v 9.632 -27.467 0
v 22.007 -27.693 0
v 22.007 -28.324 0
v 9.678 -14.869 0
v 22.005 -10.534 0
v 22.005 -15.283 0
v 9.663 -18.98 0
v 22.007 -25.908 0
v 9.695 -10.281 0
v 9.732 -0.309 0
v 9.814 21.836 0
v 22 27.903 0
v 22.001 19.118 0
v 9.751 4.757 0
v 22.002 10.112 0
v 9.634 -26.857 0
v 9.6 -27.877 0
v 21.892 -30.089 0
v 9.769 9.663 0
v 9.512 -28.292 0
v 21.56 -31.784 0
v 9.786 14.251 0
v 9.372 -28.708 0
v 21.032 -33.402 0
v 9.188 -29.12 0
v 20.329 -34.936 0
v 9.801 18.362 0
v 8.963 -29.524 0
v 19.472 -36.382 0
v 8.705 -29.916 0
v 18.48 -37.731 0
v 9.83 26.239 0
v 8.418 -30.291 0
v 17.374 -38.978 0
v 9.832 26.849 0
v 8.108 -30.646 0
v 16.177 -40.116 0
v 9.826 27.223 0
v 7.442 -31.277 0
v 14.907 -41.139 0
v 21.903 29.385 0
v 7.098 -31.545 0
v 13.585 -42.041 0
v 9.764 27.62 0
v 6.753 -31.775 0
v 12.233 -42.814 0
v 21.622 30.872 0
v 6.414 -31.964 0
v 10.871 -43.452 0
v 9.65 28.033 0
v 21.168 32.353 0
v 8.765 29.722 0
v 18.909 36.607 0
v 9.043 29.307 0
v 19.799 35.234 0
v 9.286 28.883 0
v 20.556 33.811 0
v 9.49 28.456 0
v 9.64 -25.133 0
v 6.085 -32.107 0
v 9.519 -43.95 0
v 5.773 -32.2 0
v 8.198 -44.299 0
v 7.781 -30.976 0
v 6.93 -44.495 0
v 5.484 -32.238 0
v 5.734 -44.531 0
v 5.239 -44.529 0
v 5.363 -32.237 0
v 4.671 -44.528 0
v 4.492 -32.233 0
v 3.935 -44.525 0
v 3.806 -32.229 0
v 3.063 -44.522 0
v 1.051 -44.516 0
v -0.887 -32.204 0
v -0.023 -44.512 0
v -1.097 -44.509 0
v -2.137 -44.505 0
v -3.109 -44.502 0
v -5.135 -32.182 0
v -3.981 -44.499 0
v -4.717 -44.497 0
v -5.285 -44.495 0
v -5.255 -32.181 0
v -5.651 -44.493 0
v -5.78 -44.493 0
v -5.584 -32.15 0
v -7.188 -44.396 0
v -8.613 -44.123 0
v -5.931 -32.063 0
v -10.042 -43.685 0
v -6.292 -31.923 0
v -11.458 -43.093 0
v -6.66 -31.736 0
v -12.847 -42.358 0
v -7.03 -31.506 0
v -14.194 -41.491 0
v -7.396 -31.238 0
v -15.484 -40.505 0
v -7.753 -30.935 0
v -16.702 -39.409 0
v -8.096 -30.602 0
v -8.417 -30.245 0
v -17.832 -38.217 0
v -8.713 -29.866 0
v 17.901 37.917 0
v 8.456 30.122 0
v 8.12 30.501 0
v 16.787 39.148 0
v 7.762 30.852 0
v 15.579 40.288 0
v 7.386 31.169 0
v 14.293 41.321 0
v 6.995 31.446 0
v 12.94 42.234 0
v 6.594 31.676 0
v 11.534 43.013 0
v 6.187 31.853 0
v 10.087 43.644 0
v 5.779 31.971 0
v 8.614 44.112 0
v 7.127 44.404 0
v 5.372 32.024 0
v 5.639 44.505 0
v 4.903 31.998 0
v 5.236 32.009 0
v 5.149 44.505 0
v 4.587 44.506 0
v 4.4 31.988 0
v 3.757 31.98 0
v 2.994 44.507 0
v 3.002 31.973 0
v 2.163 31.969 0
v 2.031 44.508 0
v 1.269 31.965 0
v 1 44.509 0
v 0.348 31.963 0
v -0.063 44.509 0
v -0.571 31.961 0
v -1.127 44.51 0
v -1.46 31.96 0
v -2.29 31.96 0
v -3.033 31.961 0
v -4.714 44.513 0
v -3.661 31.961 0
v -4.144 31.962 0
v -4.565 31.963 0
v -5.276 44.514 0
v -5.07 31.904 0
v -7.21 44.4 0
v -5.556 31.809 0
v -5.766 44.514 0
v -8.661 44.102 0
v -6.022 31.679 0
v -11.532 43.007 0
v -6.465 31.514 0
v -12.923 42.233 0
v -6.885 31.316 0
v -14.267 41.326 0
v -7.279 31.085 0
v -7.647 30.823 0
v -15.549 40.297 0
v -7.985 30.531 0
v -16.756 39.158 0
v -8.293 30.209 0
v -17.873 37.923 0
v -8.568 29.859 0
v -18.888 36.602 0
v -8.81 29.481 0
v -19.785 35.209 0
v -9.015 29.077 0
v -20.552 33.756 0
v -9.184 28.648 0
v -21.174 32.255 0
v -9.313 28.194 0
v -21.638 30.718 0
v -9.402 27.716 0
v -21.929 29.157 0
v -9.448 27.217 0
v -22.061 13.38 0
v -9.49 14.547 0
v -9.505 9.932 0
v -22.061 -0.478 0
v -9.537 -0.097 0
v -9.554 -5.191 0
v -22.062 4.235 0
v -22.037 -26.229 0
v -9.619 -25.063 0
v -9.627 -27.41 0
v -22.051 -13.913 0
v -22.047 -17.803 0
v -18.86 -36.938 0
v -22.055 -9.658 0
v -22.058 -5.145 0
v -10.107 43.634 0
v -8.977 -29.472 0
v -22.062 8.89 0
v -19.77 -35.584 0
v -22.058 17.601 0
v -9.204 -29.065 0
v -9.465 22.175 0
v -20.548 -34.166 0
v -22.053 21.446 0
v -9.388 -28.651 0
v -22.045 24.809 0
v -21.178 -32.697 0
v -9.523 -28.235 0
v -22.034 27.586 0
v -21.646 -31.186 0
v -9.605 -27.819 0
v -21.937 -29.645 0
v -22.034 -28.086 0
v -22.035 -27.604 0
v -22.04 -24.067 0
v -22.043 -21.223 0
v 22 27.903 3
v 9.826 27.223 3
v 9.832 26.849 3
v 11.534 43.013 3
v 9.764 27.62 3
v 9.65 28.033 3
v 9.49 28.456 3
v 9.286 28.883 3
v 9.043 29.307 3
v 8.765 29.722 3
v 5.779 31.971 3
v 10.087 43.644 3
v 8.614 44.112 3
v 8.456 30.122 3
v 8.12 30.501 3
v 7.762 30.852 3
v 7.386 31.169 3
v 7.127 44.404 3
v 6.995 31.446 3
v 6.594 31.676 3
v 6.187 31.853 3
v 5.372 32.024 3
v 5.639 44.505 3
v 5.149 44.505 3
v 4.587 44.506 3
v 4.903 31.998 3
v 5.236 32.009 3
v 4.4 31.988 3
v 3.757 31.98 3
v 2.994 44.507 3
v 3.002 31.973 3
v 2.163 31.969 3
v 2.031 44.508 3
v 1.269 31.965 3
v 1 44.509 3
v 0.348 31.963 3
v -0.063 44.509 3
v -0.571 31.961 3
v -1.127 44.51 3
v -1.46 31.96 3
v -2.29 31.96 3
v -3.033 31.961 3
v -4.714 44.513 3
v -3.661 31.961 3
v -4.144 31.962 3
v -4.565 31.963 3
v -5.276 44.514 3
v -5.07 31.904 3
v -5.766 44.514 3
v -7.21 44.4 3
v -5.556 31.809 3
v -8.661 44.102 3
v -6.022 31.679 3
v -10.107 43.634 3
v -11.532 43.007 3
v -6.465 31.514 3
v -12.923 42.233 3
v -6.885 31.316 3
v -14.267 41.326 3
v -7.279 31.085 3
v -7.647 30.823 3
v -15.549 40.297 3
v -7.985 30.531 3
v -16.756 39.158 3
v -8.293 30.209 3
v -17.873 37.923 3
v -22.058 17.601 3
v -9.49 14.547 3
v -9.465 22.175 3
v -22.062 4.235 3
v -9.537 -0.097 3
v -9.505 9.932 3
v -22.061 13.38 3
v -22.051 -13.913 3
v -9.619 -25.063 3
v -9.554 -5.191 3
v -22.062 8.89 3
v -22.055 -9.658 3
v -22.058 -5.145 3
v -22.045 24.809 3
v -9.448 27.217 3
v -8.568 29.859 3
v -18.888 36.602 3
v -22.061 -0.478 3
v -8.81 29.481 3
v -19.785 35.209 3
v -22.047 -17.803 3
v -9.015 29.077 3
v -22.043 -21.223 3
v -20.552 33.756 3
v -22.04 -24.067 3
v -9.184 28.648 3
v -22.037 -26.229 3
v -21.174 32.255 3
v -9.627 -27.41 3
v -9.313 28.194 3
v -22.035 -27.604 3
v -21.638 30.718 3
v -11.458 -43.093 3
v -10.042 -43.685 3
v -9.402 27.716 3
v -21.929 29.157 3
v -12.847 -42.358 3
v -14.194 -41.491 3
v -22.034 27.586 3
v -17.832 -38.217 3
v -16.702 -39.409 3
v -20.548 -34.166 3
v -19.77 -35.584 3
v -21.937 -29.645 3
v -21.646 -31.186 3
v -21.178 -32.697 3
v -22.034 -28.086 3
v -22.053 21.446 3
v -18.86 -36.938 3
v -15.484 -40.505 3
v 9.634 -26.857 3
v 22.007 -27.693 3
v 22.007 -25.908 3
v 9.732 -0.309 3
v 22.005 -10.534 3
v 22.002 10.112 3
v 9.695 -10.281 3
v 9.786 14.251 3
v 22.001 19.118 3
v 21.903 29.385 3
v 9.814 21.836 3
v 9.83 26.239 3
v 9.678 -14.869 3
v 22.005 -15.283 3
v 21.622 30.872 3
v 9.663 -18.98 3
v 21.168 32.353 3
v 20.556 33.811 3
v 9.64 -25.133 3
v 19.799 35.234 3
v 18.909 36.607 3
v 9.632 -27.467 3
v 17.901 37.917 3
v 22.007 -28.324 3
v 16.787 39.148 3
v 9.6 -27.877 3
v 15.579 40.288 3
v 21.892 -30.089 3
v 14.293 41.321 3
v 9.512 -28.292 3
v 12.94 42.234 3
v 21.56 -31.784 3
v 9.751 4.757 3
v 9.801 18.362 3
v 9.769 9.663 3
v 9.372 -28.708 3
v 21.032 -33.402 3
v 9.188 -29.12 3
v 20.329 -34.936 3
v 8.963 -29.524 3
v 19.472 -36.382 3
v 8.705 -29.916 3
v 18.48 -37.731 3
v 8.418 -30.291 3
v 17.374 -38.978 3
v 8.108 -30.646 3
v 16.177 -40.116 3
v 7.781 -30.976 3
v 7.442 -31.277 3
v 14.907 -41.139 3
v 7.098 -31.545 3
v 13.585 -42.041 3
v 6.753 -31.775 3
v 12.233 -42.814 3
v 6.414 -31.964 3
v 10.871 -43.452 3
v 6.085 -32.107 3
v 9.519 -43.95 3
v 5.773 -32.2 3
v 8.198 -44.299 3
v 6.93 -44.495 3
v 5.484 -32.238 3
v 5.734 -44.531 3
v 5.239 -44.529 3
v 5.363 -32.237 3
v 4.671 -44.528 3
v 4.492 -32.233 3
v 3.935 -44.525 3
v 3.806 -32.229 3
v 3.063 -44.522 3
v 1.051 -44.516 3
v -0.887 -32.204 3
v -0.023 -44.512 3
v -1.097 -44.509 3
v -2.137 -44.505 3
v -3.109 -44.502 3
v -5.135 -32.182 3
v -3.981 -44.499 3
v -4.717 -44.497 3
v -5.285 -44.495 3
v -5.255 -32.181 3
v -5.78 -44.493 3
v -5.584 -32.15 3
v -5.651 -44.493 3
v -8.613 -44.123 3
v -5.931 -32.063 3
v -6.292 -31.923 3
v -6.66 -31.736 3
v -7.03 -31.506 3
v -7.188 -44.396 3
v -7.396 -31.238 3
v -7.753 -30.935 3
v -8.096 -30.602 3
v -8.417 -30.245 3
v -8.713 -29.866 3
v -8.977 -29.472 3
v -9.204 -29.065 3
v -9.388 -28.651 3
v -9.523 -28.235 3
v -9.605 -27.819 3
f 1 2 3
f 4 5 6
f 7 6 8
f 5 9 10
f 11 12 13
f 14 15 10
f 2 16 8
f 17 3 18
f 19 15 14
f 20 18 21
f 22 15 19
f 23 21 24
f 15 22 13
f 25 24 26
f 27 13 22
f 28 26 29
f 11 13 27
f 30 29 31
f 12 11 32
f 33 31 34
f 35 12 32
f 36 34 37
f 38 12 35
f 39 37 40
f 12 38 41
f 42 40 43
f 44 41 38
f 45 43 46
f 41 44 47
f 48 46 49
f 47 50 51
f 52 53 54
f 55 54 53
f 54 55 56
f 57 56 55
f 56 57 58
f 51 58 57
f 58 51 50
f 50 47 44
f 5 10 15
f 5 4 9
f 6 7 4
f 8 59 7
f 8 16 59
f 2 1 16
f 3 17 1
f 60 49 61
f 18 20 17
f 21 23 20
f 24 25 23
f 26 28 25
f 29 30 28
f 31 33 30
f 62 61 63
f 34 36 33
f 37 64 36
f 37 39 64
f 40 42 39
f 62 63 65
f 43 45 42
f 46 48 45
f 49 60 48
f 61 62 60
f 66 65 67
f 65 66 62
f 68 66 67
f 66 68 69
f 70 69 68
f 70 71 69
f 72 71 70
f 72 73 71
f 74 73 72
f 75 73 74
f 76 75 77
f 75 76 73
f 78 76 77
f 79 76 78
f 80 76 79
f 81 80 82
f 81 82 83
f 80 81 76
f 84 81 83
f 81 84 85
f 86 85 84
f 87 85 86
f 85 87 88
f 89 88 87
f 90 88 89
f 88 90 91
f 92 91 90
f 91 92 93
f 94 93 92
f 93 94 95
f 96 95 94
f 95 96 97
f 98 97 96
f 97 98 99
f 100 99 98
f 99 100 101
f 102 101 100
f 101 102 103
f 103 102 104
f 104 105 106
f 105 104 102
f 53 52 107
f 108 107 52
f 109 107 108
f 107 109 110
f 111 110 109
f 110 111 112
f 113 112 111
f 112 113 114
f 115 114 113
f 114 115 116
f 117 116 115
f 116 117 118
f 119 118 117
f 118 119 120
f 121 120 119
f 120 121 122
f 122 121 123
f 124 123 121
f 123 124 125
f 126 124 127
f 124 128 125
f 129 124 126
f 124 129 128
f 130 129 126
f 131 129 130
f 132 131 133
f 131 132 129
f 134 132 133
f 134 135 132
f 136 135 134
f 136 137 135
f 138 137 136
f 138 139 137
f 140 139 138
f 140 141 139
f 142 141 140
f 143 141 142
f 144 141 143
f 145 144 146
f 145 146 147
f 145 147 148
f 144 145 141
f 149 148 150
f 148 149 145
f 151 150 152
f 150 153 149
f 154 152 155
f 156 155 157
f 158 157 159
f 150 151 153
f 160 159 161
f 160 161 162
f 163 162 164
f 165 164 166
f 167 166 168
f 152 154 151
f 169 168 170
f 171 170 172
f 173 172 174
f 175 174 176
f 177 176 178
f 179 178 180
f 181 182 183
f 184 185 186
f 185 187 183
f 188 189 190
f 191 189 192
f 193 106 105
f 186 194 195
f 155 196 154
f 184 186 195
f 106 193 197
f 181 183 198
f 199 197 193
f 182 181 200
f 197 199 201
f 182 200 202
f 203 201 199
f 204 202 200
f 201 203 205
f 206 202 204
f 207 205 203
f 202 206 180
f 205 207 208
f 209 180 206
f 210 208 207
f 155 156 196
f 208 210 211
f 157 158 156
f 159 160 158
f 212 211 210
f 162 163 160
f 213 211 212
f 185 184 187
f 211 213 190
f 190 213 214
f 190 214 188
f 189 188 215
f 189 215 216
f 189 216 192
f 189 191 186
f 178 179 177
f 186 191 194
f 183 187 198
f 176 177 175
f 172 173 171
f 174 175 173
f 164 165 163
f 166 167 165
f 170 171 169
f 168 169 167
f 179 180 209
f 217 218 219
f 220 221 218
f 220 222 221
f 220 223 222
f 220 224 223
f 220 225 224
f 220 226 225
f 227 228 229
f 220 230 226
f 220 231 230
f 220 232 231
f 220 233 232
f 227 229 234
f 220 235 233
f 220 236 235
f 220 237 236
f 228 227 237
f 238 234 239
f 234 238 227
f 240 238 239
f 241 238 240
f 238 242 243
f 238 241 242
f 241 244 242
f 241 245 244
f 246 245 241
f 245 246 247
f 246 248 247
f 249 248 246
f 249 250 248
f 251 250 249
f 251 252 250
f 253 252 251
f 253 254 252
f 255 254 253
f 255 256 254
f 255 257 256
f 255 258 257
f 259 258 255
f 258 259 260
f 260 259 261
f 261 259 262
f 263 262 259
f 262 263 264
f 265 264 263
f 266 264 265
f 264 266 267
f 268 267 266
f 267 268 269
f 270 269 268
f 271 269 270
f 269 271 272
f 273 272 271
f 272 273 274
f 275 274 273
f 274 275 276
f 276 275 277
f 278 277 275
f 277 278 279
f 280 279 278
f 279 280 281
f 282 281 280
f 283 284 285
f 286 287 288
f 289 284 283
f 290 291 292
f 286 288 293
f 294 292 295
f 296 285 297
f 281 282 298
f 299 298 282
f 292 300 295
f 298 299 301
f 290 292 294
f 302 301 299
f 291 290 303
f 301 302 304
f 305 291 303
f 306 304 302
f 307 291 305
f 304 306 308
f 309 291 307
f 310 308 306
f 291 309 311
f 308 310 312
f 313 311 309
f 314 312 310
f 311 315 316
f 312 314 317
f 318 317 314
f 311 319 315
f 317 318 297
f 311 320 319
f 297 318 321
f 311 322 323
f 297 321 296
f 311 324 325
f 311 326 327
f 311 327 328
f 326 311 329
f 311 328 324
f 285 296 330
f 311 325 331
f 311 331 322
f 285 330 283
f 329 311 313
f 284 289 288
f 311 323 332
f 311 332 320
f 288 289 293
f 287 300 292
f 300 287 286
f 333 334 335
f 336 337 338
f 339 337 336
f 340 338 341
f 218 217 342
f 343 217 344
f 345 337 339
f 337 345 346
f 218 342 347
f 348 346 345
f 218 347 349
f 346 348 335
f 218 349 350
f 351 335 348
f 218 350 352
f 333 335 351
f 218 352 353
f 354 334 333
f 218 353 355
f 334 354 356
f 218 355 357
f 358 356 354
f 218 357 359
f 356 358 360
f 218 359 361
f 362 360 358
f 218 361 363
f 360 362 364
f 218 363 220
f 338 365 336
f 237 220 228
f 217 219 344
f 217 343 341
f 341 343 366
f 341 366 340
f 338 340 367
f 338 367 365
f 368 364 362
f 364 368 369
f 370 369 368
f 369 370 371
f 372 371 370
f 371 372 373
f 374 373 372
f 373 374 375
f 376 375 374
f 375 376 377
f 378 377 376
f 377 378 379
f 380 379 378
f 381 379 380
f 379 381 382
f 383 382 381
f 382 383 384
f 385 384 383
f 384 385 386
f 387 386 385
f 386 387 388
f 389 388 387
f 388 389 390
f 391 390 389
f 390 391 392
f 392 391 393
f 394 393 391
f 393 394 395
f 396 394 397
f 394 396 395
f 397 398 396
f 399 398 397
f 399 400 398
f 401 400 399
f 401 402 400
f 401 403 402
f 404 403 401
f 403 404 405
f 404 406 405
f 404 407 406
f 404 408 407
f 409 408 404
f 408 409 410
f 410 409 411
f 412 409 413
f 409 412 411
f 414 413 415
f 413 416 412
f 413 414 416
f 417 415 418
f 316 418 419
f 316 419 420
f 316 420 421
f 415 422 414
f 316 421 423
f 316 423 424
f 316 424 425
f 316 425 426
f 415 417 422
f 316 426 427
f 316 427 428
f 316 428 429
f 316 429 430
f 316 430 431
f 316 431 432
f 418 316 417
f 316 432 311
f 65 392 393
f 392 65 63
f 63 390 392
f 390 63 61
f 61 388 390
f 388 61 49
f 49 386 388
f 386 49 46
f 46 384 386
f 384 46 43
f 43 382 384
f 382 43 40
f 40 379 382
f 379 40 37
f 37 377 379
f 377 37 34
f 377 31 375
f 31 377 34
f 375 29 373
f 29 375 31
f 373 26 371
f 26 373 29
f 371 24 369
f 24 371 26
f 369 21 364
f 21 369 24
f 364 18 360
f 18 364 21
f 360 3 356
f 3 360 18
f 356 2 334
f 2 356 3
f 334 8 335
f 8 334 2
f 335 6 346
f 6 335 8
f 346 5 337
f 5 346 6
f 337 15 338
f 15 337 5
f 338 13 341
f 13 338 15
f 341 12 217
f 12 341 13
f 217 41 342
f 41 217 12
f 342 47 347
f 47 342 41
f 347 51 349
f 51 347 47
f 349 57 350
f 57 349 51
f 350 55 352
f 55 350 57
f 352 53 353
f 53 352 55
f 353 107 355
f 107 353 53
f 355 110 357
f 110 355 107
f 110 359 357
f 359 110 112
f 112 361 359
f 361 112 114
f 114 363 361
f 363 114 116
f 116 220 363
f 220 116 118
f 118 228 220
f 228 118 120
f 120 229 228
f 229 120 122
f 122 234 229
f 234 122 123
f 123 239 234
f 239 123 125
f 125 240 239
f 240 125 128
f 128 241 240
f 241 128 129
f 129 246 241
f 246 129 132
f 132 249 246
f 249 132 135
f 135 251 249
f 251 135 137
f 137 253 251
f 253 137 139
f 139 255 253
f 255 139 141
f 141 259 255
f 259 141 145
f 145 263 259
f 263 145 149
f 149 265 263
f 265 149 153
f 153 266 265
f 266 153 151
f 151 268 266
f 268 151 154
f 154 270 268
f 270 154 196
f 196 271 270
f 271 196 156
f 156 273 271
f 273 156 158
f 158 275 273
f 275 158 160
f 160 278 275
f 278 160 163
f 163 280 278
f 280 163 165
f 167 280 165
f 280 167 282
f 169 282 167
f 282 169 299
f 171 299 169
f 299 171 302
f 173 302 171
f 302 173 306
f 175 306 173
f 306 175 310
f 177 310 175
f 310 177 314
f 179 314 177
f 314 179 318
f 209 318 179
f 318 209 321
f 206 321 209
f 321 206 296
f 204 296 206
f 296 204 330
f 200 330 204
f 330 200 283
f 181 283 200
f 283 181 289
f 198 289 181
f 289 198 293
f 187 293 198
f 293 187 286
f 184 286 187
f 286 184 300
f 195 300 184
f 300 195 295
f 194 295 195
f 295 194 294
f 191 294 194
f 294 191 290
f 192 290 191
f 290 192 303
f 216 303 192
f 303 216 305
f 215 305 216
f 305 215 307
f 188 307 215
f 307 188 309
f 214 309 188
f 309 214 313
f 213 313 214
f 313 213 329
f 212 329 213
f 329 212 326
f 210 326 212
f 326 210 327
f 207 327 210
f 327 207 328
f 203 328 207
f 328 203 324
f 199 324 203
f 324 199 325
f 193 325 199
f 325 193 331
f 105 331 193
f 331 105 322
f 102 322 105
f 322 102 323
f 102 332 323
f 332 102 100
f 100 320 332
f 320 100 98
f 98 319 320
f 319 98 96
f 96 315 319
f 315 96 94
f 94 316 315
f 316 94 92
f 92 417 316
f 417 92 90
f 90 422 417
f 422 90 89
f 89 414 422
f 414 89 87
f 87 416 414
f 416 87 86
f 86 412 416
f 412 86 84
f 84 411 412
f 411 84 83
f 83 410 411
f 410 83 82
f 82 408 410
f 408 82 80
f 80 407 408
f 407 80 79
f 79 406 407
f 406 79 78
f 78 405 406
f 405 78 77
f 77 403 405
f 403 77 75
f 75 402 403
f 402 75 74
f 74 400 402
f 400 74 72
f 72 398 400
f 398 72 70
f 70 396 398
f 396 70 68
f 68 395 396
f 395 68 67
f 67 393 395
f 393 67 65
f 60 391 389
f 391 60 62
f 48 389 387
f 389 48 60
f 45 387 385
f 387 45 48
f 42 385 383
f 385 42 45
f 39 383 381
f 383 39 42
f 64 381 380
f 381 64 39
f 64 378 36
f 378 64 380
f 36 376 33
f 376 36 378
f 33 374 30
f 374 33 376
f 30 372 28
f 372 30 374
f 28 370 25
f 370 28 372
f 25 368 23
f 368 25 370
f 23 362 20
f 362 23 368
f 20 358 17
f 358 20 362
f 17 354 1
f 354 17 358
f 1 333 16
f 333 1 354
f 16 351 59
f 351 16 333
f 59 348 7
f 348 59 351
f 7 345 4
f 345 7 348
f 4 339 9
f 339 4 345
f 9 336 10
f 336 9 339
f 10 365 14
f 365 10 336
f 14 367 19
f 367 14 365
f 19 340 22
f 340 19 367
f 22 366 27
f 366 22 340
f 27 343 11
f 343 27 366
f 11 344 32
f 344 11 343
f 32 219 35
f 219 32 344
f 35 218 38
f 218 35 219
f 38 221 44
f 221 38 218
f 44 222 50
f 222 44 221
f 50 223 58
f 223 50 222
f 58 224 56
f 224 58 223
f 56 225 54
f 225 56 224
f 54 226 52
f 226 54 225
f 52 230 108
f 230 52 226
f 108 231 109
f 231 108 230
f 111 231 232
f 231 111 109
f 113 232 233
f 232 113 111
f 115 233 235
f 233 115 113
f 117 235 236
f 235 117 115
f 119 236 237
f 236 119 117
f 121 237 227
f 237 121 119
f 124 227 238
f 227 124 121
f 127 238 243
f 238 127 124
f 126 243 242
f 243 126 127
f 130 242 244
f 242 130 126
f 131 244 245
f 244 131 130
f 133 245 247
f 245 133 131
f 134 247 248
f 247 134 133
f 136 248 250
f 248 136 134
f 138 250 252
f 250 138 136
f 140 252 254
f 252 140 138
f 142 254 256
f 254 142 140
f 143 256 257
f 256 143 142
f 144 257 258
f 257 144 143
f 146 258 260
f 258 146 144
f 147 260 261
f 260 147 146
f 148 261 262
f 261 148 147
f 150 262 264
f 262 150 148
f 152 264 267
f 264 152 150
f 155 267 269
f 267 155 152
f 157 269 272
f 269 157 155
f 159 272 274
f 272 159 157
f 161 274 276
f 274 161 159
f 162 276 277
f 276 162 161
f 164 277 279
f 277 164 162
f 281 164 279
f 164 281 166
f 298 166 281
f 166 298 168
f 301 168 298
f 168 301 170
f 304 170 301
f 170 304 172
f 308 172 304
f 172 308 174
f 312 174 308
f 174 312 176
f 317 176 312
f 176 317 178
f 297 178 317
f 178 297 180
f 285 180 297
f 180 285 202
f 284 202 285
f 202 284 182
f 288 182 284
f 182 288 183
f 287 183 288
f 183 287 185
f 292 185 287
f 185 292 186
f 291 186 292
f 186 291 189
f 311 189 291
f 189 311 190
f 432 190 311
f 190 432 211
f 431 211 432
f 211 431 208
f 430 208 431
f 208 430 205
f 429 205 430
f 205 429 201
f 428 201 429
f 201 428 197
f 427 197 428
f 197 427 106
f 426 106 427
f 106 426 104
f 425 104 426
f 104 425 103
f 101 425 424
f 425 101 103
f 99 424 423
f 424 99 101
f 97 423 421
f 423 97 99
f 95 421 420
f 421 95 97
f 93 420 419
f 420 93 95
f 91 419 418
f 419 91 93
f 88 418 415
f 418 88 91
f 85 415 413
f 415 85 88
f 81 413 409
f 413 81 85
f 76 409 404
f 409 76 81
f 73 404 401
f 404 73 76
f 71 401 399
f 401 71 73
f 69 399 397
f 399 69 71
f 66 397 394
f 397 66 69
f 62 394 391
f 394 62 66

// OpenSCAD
// Generated from 交通部公路局（原交通部公路總局）「新式號牌使用之英文字、數字字體」author trace
fudge = 0.1;

module glyph_2012_0(h = 3) {
  difference() {
    linear_extrude(height = h)
      polygon(points = [[-5.7662, 44.5141], [-7.21, 44.3997], [-8.6614, 44.1022], [-10.1067, 43.6337], [-11.5319, 43.0067], [-12.9233, 42.2334], [-14.267, 41.326], [-15.5491, 40.297], [-16.7558, 39.1585], [-17.8733, 37.9228], [-18.8877, 36.6024], [-19.7852, 35.2093], [-20.5519, 33.756], [-21.174, 32.2546], [-21.6377, 30.7176], [-21.9292, 29.1572], [-22.0345, 27.5856], [-22.0449, 24.8095], [-22.0526, 21.4461], [-22.058, 17.6012], [-22.0612, 13.3805], [-22.0625, 8.8899], [-22.0623, 4.235], [-22.0607, -0.4785], [-22.0582, -5.1447], [-22.0549, -9.658], [-22.0511, -13.9126], [-22.0472, -17.8027], [-22.0434, -21.2227], [-22.0399, -24.0667], [-22.0371, -26.2291], [-22.0352, -27.6041], [-22.0345, -28.0859], [-21.9367, -29.645], [-21.6464, -31.1857], [-21.1785, -32.6966], [-20.548, -34.1665], [-19.7701, -35.584], [-18.8597, -36.9378], [-17.8319, -38.2168], [-16.7017, -39.4095], [-15.4842, -40.5048], [-14.1944, -41.4912], [-12.8473, -42.3576], [-11.4581, -43.0926], [-10.0416, -43.6849], [-8.6131, -44.1233], [-7.1875, -44.3965], [-5.7799, -44.4931], [-5.6506, -44.4935], [-5.2851, -44.4948], [-4.7173, -44.4966], [-3.9809, -44.4991], [-3.1095, -44.5019], [-2.1369, -44.5051], [-1.0968, -44.5086], [-0.023, -44.5121], [1.0507, -44.5157], [2.0908, -44.5191], [3.0634, -44.5223], [3.9348, -44.5252], [4.6712, -44.5276], [5.239, -44.5295], [5.6045, -44.5307], [5.7338, -44.5311], [6.9298, -44.4955], [8.1984, -44.2995], [9.5189, -43.9496], [10.8707, -43.4522], [12.2329, -42.8137], [13.5851, -42.0407], [14.9066, -41.1394], [16.1766, -40.1165], [17.3745, -38.9783], [18.4798, -37.7312], [19.4716, -36.3818], [20.3294, -34.9365], [21.0325, -33.4016], [21.5602, -31.7837], [21.8919, -30.0892], [22.0069, -28.3245], [22.0069, -27.693], [22.0066, -25.9084], [22.0063, -23.1355], [22.0059, -19.5389], [22.0054, -15.2833], [22.0049, -10.5336], [22.0043, -5.4545], [22.0037, -0.2106], [22.0031, 5.0334], [22.0025, 10.1125], [22.0019, 14.8622], [22.0014, 19.1178], [22.001, 22.7144], [22.0007, 25.4873], [22.0005, 27.2719], [22.0004, 27.9034], [21.9035, 29.3846], [21.6217, 30.8723], [21.1682, 32.3526], [20.5563, 33.8112], [19.799, 35.2342], [18.9095, 36.6074], [17.901, 37.9168], [16.7866, 39.1483], [15.5795, 40.2877], [14.2929, 41.3211], [12.9399, 42.2343], [11.5336, 43.0133], [10.0873, 43.6439], [8.6141, 44.1121], [7.1271, 44.4038], [5.6395, 44.5049], [5.5114, 44.505], [5.1494, 44.5053], [4.5869, 44.5058], [3.8573, 44.5064], [2.9941, 44.5071], [2.0307, 44.5078], [1.0004, 44.5087], [-0.0634, 44.5095], [-1.1271, 44.5104], [-2.1574, 44.5112], [-3.1208, 44.512], [-3.9841, 44.5127], [-4.7136, 44.5133], [-5.2761, 44.5137], [-5.6381, 44.514]]);
    translate([0, 0, -fudge])
      linear_extrude(height = h + 2 * fudge)
        polygon(points = [[5.372, 32.0236], [5.7786, 31.971], [6.1874, 31.853], [6.5943, 31.6758], [6.9952, 31.4457], [7.386, 31.1691], [7.7624, 30.8521], [8.1205, 30.5011], [8.4559, 30.1224], [8.7648, 29.7223], [9.0427, 29.307], [9.2858, 28.8828], [9.4898, 28.4561], [9.6505, 28.033], [9.764, 27.62], [9.8259, 27.2232], [9.8323, 26.849], [9.8301, 26.239], [9.8237, 24.5151], [9.8138, 21.8364], [9.8009, 18.3621], [9.7857, 14.2513], [9.7688, 9.6631], [9.7507, 4.7567], [9.7319, -0.3089], [9.7132, -5.3745], [9.6951, -10.281], [9.6781, -14.8692], [9.6629, -18.98], [9.6501, -22.4543], [9.6402, -25.1329], [9.6338, -26.8568], [9.6316, -27.4668], [9.5999, -27.8772], [9.5116, -28.2923], [9.3722, -28.7079], [9.1876, -29.1199], [8.9632, -29.5239], [8.7047, -29.9157], [8.4177, -30.2912], [8.1079, -30.6461], [7.781, -30.9762], [7.4424, -31.2773], [7.0979, -31.5452], [6.7531, -31.7755], [6.4137, -31.9642], [6.0852, -32.1069], [5.7732, -32.1996], [5.4836, -32.2378], [5.363, -32.2372], [5.0221, -32.2354], [4.4925, -32.2326], [3.8056, -32.2289], [2.9929, -32.2246], [2.0857, -32.2198], [1.1157, -32.2147], [0.1142, -32.2094], [-0.8874, -32.2041], [-1.8574, -32.199], [-2.7646, -32.1942], [-3.5773, -32.1899], [-4.2642, -32.1863], [-4.7938, -32.1835], [-5.1347, -32.1817], [-5.2553, -32.181], [-5.584, -32.15], [-5.9315, -32.0626], [-6.292, -31.9231], [-6.6601, -31.7362], [-7.0301, -31.5062], [-7.3964, -31.2376], [-7.7535, -30.9349], [-8.0956, -30.6025], [-8.4174, -30.2448], [-8.7131, -29.8664], [-8.9771, -29.4718], [-9.2039, -29.0653], [-9.3878, -28.6514], [-9.5234, -28.2346], [-9.6049, -27.8193], [-9.6268, -27.41], [-9.6248, -26.7965], [-9.6191, -25.0628], [-9.6103, -22.3688], [-9.5989, -18.8746], [-9.5854, -14.7403], [-9.5703, -10.1258], [-9.5542, -5.1913], [-9.5375, -0.0967], [-9.5209, 4.9979], [-9.5048, 9.9324], [-9.4897, 14.5469], [-9.4762, 18.6812], [-9.4648, 22.1754], [-9.456, 24.8694], [-9.4503, 26.6032], [-9.4483, 27.2166], [-9.4021, 27.7164], [-9.3134, 28.1937], [-9.184, 28.6476], [-9.0155, 29.0771], [-8.8097, 29.4812], [-8.5682, 29.8588], [-8.2927, 30.2091], [-7.985, 30.5309], [-7.6467, 30.8233], [-7.2795, 31.0853], [-6.8852, 31.3159], [-6.4653, 31.5141], [-6.0217, 31.6788], [-5.556, 31.8091], [-5.0699, 31.9041], [-4.565, 31.9626], [-4.4551, 31.9624], [-4.1441, 31.9619], [-3.6606, 31.9613], [-3.033, 31.9607], [-2.2899, 31.9604], [-1.4596, 31.9605], [-0.5707, 31.9612], [0.3484, 31.9627], [1.2692, 31.9651], [2.1633, 31.9686], [3.0022, 31.9735], [3.7574, 31.9798], [4.4004, 31.9878], [4.9029, 31.9977], [5.2362, 32.0095], [5.372, 32.0236], [5.372, 32.0236], [5.372, 32.0236], [5.372, 32.0236], [5.372, 32.0236], [5.372, 32.0236], [5.372, 32.0236], [5.372, 32.0236], [5.372, 32.0236], [5.372, 32.0236], [5.372, 32.0236], [5.372, 32.0236], [5.372, 32.0236], [5.372, 32.0236], [5.372, 32.0236], [5.372, 32.0236]]);
  }
}

glyph_2012_0();
